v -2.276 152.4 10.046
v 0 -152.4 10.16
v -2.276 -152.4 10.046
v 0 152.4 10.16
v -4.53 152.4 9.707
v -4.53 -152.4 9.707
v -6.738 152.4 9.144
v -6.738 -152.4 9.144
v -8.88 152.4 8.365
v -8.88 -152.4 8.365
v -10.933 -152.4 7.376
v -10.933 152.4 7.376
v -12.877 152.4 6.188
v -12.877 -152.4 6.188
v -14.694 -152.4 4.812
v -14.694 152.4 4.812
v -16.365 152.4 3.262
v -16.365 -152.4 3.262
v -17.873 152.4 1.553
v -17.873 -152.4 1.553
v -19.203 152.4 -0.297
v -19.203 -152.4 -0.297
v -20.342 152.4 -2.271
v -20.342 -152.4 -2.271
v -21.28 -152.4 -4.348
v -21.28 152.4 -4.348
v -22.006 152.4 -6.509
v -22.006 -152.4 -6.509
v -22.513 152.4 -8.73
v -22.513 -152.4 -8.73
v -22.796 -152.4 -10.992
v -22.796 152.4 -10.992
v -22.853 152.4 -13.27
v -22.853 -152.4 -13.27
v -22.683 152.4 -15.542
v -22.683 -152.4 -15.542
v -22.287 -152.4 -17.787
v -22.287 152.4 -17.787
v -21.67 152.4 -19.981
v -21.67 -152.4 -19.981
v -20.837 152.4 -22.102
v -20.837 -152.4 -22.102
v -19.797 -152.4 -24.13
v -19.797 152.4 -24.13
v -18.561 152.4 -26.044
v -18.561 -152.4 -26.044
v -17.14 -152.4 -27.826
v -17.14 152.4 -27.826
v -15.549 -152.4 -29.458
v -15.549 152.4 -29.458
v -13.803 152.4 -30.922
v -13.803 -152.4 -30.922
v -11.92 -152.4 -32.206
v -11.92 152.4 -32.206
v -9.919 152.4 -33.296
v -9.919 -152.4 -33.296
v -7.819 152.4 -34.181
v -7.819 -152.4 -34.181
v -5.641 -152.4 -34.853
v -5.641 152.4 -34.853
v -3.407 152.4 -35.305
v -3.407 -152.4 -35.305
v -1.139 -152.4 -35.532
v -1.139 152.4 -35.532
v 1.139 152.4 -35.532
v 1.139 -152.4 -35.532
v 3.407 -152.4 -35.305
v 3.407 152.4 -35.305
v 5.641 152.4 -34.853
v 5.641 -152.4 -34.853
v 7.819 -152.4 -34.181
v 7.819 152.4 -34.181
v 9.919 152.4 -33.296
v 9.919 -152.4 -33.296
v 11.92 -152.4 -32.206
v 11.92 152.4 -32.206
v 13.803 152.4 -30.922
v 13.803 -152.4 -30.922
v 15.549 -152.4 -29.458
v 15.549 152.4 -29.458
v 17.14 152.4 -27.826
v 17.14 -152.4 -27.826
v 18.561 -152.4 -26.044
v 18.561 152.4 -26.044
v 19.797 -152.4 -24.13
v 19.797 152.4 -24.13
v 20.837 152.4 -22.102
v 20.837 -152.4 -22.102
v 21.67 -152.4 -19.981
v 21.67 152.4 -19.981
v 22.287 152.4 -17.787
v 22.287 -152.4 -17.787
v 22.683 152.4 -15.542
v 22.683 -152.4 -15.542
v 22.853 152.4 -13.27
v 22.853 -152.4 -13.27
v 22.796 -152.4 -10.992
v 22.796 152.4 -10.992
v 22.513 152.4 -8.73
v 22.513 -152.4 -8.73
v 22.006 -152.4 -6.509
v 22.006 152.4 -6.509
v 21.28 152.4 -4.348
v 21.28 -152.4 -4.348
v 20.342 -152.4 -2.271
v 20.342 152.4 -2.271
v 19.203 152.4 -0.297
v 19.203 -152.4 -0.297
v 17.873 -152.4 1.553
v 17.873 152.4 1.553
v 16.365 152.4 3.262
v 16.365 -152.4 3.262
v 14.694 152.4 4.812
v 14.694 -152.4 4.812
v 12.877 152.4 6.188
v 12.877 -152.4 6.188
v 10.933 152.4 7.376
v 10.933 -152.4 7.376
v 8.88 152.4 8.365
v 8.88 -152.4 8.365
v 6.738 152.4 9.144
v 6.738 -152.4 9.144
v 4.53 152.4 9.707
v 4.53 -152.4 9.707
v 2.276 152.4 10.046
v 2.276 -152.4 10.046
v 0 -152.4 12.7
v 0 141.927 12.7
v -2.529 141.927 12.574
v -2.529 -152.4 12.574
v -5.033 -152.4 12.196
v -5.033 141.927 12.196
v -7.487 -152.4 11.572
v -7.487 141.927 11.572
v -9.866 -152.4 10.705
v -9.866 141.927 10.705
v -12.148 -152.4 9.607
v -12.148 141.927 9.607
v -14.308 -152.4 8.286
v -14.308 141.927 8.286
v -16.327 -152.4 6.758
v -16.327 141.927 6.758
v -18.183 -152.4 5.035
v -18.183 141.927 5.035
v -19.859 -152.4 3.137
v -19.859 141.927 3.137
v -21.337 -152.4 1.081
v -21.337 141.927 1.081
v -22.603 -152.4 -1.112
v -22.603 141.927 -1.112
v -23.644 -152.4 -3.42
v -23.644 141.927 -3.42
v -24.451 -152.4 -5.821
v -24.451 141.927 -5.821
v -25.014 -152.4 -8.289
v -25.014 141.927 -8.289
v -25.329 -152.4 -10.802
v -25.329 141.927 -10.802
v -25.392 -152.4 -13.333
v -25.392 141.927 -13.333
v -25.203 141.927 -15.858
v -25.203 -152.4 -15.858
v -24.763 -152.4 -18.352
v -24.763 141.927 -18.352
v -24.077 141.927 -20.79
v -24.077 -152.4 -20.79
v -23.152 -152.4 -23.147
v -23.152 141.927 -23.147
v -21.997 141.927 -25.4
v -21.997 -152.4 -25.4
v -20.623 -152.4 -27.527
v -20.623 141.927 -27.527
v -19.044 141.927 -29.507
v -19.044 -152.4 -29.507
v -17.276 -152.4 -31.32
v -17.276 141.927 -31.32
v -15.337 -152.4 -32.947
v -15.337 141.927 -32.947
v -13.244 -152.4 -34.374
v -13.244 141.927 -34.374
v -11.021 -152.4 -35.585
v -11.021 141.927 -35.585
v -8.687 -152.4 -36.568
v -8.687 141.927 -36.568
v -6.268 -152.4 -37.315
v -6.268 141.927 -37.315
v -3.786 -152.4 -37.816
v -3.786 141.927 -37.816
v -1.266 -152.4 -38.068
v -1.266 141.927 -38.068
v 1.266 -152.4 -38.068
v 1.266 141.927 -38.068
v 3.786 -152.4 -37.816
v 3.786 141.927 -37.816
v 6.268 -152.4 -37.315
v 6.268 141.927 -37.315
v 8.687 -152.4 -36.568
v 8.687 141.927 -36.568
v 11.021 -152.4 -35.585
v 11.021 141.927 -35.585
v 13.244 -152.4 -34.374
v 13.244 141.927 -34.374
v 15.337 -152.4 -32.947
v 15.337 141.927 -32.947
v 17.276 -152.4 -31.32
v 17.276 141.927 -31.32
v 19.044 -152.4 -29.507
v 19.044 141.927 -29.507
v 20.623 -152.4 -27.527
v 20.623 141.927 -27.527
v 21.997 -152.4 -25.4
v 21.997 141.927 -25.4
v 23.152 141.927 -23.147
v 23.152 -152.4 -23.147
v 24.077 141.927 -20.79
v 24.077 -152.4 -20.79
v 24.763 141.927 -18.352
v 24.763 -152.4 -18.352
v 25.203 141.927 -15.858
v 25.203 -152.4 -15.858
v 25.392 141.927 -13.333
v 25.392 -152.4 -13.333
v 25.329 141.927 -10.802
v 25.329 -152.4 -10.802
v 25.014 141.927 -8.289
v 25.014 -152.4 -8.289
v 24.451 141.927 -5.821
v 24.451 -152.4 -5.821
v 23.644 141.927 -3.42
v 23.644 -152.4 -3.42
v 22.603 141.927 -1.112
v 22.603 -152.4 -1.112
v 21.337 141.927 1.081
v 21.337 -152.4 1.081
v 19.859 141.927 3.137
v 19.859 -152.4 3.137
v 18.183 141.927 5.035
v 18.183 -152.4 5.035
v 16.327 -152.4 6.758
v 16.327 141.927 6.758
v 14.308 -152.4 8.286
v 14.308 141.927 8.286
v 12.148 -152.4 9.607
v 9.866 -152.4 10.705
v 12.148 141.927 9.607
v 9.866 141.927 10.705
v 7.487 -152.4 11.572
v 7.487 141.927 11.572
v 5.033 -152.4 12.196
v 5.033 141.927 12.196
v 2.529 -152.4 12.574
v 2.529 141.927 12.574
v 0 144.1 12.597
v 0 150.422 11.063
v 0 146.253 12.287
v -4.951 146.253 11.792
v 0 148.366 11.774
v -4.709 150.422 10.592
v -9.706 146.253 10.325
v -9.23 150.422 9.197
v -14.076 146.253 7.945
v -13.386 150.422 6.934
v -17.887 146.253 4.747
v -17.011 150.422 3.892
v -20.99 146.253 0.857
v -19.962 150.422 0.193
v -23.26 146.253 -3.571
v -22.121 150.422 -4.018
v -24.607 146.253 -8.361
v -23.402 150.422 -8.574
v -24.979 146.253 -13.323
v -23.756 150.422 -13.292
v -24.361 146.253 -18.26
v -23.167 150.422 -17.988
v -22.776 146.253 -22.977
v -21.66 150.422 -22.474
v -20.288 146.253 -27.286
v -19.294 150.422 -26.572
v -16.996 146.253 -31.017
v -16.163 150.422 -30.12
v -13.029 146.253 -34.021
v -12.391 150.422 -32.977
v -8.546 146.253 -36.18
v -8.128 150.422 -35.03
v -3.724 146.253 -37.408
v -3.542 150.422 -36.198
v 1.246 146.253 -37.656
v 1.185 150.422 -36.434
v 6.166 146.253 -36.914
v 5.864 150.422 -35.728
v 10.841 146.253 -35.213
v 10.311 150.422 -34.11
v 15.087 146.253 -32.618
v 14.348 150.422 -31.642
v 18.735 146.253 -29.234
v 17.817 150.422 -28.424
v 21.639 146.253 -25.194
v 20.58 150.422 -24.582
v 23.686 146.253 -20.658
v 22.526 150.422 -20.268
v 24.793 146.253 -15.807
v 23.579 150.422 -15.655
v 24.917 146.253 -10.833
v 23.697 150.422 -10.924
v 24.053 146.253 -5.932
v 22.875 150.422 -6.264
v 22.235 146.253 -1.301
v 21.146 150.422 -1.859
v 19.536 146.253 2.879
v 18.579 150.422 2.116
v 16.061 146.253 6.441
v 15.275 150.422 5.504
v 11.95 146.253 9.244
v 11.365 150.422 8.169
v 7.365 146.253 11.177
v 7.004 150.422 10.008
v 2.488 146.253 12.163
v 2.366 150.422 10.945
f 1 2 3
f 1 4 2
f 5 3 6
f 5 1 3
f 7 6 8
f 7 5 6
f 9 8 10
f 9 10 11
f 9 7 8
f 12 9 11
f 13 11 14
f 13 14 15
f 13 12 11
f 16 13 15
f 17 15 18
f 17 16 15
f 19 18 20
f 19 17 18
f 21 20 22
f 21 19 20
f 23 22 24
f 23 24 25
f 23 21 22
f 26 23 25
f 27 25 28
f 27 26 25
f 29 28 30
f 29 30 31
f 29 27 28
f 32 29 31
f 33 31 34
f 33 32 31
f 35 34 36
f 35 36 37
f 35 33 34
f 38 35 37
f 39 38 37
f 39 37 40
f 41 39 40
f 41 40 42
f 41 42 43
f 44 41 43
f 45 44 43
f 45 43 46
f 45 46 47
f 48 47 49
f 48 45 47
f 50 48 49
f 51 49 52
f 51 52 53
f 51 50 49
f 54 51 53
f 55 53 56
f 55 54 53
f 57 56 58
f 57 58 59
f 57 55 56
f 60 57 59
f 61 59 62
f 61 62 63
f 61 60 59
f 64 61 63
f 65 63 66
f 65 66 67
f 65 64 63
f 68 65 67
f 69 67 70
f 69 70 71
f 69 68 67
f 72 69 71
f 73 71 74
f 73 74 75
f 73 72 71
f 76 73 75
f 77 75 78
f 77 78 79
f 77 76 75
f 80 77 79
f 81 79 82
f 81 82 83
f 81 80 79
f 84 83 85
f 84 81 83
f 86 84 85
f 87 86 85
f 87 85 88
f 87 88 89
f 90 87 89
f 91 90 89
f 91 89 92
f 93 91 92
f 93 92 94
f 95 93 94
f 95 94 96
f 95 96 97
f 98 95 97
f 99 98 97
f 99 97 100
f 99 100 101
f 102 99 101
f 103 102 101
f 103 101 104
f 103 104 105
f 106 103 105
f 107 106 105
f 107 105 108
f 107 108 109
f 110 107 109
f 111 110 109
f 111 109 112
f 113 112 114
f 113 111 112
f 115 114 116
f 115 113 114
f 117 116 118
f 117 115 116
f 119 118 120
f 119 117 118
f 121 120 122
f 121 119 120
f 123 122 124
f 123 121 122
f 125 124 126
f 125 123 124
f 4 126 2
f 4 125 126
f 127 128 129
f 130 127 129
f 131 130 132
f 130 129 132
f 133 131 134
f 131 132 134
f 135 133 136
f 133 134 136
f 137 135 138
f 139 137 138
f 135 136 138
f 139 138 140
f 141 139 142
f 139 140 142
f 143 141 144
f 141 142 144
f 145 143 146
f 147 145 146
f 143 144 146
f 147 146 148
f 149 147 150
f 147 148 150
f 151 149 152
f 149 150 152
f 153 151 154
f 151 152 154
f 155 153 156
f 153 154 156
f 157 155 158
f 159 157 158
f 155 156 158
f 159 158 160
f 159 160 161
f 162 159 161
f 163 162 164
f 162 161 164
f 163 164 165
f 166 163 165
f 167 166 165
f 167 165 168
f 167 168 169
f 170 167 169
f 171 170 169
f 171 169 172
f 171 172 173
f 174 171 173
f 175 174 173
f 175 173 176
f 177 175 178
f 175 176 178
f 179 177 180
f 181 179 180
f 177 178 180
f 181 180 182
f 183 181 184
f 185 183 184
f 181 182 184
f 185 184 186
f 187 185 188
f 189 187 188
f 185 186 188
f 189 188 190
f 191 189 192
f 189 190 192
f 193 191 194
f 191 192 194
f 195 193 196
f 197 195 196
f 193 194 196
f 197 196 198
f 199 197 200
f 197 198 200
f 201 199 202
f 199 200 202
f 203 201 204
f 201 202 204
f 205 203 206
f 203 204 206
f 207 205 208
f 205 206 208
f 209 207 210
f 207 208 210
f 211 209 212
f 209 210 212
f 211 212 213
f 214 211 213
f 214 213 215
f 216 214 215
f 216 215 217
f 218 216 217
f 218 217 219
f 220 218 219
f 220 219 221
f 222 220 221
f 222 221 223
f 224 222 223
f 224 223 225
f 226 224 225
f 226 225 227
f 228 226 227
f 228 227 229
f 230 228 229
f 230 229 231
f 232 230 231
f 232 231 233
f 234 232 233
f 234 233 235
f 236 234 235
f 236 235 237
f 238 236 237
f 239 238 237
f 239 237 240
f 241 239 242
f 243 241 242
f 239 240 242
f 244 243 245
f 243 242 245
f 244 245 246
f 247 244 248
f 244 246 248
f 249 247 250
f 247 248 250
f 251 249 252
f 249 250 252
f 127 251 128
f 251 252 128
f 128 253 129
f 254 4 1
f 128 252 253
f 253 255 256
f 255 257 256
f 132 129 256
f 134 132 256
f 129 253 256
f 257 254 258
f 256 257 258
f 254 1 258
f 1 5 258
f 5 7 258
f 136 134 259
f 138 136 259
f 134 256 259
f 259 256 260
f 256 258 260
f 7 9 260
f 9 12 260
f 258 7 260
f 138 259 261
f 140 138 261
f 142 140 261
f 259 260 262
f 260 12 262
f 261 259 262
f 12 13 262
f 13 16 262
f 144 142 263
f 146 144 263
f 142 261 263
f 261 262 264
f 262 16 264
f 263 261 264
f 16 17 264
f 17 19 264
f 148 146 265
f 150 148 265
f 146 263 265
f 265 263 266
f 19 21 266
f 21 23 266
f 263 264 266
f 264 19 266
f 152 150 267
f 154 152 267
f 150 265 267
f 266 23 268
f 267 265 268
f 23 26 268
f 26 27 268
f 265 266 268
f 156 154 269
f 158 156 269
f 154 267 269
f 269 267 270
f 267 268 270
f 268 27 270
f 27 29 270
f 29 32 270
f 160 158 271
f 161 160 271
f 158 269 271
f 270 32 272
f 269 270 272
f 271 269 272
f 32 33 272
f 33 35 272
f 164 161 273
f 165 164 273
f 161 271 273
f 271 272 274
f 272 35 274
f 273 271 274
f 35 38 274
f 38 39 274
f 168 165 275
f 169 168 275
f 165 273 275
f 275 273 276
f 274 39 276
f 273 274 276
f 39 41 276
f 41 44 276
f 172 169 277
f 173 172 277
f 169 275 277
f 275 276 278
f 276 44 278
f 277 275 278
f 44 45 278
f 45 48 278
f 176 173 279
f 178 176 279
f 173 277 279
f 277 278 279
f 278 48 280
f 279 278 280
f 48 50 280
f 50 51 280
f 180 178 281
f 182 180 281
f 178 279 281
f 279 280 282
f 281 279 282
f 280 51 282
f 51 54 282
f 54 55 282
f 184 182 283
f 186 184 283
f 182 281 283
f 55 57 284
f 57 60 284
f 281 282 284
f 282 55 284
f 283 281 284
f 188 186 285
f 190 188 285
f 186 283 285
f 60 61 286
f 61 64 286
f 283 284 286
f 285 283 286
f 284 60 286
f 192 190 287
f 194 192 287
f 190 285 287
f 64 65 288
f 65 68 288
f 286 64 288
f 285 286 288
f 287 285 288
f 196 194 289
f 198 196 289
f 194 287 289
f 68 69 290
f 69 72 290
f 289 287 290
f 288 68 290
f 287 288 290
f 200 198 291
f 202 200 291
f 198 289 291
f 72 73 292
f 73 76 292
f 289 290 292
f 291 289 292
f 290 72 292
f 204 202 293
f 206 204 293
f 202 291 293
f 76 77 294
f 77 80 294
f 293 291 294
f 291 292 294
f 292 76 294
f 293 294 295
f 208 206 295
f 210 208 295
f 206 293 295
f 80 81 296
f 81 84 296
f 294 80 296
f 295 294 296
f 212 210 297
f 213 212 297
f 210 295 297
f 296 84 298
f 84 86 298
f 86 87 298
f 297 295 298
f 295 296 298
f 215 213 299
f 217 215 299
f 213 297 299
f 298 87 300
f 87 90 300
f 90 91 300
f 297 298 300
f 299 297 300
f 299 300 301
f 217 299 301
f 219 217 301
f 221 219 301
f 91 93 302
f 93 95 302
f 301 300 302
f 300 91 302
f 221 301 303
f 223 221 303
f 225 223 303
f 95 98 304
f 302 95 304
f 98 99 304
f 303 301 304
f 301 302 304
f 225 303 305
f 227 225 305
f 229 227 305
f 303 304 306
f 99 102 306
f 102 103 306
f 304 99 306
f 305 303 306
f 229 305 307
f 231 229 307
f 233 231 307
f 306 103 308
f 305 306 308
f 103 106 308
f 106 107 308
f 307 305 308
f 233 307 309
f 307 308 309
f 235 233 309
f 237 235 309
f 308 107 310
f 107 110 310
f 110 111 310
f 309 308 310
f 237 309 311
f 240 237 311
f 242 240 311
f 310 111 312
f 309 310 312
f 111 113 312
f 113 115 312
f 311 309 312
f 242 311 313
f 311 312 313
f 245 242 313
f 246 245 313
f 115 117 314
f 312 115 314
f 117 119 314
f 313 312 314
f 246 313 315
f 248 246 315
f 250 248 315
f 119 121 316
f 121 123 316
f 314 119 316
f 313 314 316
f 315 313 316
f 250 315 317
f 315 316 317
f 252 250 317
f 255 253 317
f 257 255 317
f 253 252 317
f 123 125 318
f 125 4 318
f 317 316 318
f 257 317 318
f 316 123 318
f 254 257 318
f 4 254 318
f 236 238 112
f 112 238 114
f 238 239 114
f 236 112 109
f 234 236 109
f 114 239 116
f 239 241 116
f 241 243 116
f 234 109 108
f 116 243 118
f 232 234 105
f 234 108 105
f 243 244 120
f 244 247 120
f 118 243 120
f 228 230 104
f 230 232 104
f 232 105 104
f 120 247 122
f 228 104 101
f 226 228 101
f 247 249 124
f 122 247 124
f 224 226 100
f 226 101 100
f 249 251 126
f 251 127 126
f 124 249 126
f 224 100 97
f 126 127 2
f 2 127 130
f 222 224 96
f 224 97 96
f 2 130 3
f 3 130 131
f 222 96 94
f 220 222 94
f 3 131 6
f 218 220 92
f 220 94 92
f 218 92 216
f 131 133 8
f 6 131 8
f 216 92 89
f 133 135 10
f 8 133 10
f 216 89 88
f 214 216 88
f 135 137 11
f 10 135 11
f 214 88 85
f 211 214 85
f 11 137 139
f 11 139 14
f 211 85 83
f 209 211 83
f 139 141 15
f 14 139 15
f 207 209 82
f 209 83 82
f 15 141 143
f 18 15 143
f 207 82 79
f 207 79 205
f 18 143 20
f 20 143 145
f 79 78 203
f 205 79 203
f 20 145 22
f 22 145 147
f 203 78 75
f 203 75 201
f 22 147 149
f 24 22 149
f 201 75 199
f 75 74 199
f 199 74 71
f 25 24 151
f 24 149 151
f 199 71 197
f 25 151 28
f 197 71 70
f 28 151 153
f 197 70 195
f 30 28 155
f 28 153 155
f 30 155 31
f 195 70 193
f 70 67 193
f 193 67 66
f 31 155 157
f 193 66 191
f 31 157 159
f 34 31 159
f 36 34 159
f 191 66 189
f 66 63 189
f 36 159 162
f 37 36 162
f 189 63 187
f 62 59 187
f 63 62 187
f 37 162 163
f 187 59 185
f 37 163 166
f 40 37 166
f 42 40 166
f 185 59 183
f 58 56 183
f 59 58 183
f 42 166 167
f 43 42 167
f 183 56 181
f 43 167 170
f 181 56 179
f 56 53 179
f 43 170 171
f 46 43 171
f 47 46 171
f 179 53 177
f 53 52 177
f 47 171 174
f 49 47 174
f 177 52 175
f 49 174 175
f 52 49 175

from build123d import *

# Parameters (mm, degrees)
F0_W = 304.8
F0_H = 25.4
F2_T = -2.54


# Not quite as in the source:
# - a fillet or chamfer that OpenCascade refuses, or shapes differently, is made with other operations: its cross-section is extruded or revolved along the edge and cut away or added


with BuildPart() as f1:
    # F0 (on Right) → F1 (revolve)
    with BuildSketch(Plane.YZ):
        Rectangle(F0_W, F0_H)
    revolve(axis=Axis((0, 0, -12.7), (0, -1, 0)))

    # F2
    f2_openings = [f1.faces().sort_by_distance(p)[0] for p in [
        (0, 152.4, -12.7),
        (0, -152.4, -12.7),
    ]]
    offset(amount=F2_T, openings=f2_openings)

    # F3: fillet of radius 22.86 on 1 edges, made by hand

    # F3_s1 → F3_t2 (revolve, cut)
    with BuildSketch(Plane.YZ):
        with BuildLine():
            ThreePointArc((141.9273117109, 12.7), (147.3154653836, 12.0559267194), (152.4, 10.16))
            Line((152.4, 10.16), (152.4, 12.7))
            Line((152.4, 12.7), (141.9273117109, 12.7))
        make_face()
    revolve(axis=Axis((0, 152.4, -12.7), (0, -1, 0)), mode=Mode.SUBTRACT)


solid = f1.part
